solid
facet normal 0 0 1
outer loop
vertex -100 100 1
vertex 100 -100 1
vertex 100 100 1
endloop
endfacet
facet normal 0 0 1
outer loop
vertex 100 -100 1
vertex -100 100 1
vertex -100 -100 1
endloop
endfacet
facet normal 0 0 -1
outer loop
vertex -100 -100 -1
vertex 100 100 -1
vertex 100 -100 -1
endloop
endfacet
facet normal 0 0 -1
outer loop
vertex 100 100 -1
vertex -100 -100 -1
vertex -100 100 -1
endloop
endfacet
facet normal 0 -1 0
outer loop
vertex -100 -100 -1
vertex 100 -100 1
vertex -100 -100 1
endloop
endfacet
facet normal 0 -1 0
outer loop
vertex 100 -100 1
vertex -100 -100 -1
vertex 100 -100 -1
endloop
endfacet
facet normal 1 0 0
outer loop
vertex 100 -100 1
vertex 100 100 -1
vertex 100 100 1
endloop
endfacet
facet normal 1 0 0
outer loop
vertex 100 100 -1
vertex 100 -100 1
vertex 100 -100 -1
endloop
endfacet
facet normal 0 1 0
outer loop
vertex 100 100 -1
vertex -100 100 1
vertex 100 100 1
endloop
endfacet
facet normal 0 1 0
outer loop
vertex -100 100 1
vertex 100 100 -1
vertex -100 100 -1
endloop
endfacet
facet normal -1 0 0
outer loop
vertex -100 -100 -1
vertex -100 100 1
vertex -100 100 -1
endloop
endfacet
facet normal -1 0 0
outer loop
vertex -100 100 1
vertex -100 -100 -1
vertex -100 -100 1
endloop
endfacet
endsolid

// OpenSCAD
$fn = 64;

length = 200;
width  = 200;
thickness = 2;

// Centered sheet so it renders reliably and shows thickness in side views
cube([length, width, thickness], center=true);
